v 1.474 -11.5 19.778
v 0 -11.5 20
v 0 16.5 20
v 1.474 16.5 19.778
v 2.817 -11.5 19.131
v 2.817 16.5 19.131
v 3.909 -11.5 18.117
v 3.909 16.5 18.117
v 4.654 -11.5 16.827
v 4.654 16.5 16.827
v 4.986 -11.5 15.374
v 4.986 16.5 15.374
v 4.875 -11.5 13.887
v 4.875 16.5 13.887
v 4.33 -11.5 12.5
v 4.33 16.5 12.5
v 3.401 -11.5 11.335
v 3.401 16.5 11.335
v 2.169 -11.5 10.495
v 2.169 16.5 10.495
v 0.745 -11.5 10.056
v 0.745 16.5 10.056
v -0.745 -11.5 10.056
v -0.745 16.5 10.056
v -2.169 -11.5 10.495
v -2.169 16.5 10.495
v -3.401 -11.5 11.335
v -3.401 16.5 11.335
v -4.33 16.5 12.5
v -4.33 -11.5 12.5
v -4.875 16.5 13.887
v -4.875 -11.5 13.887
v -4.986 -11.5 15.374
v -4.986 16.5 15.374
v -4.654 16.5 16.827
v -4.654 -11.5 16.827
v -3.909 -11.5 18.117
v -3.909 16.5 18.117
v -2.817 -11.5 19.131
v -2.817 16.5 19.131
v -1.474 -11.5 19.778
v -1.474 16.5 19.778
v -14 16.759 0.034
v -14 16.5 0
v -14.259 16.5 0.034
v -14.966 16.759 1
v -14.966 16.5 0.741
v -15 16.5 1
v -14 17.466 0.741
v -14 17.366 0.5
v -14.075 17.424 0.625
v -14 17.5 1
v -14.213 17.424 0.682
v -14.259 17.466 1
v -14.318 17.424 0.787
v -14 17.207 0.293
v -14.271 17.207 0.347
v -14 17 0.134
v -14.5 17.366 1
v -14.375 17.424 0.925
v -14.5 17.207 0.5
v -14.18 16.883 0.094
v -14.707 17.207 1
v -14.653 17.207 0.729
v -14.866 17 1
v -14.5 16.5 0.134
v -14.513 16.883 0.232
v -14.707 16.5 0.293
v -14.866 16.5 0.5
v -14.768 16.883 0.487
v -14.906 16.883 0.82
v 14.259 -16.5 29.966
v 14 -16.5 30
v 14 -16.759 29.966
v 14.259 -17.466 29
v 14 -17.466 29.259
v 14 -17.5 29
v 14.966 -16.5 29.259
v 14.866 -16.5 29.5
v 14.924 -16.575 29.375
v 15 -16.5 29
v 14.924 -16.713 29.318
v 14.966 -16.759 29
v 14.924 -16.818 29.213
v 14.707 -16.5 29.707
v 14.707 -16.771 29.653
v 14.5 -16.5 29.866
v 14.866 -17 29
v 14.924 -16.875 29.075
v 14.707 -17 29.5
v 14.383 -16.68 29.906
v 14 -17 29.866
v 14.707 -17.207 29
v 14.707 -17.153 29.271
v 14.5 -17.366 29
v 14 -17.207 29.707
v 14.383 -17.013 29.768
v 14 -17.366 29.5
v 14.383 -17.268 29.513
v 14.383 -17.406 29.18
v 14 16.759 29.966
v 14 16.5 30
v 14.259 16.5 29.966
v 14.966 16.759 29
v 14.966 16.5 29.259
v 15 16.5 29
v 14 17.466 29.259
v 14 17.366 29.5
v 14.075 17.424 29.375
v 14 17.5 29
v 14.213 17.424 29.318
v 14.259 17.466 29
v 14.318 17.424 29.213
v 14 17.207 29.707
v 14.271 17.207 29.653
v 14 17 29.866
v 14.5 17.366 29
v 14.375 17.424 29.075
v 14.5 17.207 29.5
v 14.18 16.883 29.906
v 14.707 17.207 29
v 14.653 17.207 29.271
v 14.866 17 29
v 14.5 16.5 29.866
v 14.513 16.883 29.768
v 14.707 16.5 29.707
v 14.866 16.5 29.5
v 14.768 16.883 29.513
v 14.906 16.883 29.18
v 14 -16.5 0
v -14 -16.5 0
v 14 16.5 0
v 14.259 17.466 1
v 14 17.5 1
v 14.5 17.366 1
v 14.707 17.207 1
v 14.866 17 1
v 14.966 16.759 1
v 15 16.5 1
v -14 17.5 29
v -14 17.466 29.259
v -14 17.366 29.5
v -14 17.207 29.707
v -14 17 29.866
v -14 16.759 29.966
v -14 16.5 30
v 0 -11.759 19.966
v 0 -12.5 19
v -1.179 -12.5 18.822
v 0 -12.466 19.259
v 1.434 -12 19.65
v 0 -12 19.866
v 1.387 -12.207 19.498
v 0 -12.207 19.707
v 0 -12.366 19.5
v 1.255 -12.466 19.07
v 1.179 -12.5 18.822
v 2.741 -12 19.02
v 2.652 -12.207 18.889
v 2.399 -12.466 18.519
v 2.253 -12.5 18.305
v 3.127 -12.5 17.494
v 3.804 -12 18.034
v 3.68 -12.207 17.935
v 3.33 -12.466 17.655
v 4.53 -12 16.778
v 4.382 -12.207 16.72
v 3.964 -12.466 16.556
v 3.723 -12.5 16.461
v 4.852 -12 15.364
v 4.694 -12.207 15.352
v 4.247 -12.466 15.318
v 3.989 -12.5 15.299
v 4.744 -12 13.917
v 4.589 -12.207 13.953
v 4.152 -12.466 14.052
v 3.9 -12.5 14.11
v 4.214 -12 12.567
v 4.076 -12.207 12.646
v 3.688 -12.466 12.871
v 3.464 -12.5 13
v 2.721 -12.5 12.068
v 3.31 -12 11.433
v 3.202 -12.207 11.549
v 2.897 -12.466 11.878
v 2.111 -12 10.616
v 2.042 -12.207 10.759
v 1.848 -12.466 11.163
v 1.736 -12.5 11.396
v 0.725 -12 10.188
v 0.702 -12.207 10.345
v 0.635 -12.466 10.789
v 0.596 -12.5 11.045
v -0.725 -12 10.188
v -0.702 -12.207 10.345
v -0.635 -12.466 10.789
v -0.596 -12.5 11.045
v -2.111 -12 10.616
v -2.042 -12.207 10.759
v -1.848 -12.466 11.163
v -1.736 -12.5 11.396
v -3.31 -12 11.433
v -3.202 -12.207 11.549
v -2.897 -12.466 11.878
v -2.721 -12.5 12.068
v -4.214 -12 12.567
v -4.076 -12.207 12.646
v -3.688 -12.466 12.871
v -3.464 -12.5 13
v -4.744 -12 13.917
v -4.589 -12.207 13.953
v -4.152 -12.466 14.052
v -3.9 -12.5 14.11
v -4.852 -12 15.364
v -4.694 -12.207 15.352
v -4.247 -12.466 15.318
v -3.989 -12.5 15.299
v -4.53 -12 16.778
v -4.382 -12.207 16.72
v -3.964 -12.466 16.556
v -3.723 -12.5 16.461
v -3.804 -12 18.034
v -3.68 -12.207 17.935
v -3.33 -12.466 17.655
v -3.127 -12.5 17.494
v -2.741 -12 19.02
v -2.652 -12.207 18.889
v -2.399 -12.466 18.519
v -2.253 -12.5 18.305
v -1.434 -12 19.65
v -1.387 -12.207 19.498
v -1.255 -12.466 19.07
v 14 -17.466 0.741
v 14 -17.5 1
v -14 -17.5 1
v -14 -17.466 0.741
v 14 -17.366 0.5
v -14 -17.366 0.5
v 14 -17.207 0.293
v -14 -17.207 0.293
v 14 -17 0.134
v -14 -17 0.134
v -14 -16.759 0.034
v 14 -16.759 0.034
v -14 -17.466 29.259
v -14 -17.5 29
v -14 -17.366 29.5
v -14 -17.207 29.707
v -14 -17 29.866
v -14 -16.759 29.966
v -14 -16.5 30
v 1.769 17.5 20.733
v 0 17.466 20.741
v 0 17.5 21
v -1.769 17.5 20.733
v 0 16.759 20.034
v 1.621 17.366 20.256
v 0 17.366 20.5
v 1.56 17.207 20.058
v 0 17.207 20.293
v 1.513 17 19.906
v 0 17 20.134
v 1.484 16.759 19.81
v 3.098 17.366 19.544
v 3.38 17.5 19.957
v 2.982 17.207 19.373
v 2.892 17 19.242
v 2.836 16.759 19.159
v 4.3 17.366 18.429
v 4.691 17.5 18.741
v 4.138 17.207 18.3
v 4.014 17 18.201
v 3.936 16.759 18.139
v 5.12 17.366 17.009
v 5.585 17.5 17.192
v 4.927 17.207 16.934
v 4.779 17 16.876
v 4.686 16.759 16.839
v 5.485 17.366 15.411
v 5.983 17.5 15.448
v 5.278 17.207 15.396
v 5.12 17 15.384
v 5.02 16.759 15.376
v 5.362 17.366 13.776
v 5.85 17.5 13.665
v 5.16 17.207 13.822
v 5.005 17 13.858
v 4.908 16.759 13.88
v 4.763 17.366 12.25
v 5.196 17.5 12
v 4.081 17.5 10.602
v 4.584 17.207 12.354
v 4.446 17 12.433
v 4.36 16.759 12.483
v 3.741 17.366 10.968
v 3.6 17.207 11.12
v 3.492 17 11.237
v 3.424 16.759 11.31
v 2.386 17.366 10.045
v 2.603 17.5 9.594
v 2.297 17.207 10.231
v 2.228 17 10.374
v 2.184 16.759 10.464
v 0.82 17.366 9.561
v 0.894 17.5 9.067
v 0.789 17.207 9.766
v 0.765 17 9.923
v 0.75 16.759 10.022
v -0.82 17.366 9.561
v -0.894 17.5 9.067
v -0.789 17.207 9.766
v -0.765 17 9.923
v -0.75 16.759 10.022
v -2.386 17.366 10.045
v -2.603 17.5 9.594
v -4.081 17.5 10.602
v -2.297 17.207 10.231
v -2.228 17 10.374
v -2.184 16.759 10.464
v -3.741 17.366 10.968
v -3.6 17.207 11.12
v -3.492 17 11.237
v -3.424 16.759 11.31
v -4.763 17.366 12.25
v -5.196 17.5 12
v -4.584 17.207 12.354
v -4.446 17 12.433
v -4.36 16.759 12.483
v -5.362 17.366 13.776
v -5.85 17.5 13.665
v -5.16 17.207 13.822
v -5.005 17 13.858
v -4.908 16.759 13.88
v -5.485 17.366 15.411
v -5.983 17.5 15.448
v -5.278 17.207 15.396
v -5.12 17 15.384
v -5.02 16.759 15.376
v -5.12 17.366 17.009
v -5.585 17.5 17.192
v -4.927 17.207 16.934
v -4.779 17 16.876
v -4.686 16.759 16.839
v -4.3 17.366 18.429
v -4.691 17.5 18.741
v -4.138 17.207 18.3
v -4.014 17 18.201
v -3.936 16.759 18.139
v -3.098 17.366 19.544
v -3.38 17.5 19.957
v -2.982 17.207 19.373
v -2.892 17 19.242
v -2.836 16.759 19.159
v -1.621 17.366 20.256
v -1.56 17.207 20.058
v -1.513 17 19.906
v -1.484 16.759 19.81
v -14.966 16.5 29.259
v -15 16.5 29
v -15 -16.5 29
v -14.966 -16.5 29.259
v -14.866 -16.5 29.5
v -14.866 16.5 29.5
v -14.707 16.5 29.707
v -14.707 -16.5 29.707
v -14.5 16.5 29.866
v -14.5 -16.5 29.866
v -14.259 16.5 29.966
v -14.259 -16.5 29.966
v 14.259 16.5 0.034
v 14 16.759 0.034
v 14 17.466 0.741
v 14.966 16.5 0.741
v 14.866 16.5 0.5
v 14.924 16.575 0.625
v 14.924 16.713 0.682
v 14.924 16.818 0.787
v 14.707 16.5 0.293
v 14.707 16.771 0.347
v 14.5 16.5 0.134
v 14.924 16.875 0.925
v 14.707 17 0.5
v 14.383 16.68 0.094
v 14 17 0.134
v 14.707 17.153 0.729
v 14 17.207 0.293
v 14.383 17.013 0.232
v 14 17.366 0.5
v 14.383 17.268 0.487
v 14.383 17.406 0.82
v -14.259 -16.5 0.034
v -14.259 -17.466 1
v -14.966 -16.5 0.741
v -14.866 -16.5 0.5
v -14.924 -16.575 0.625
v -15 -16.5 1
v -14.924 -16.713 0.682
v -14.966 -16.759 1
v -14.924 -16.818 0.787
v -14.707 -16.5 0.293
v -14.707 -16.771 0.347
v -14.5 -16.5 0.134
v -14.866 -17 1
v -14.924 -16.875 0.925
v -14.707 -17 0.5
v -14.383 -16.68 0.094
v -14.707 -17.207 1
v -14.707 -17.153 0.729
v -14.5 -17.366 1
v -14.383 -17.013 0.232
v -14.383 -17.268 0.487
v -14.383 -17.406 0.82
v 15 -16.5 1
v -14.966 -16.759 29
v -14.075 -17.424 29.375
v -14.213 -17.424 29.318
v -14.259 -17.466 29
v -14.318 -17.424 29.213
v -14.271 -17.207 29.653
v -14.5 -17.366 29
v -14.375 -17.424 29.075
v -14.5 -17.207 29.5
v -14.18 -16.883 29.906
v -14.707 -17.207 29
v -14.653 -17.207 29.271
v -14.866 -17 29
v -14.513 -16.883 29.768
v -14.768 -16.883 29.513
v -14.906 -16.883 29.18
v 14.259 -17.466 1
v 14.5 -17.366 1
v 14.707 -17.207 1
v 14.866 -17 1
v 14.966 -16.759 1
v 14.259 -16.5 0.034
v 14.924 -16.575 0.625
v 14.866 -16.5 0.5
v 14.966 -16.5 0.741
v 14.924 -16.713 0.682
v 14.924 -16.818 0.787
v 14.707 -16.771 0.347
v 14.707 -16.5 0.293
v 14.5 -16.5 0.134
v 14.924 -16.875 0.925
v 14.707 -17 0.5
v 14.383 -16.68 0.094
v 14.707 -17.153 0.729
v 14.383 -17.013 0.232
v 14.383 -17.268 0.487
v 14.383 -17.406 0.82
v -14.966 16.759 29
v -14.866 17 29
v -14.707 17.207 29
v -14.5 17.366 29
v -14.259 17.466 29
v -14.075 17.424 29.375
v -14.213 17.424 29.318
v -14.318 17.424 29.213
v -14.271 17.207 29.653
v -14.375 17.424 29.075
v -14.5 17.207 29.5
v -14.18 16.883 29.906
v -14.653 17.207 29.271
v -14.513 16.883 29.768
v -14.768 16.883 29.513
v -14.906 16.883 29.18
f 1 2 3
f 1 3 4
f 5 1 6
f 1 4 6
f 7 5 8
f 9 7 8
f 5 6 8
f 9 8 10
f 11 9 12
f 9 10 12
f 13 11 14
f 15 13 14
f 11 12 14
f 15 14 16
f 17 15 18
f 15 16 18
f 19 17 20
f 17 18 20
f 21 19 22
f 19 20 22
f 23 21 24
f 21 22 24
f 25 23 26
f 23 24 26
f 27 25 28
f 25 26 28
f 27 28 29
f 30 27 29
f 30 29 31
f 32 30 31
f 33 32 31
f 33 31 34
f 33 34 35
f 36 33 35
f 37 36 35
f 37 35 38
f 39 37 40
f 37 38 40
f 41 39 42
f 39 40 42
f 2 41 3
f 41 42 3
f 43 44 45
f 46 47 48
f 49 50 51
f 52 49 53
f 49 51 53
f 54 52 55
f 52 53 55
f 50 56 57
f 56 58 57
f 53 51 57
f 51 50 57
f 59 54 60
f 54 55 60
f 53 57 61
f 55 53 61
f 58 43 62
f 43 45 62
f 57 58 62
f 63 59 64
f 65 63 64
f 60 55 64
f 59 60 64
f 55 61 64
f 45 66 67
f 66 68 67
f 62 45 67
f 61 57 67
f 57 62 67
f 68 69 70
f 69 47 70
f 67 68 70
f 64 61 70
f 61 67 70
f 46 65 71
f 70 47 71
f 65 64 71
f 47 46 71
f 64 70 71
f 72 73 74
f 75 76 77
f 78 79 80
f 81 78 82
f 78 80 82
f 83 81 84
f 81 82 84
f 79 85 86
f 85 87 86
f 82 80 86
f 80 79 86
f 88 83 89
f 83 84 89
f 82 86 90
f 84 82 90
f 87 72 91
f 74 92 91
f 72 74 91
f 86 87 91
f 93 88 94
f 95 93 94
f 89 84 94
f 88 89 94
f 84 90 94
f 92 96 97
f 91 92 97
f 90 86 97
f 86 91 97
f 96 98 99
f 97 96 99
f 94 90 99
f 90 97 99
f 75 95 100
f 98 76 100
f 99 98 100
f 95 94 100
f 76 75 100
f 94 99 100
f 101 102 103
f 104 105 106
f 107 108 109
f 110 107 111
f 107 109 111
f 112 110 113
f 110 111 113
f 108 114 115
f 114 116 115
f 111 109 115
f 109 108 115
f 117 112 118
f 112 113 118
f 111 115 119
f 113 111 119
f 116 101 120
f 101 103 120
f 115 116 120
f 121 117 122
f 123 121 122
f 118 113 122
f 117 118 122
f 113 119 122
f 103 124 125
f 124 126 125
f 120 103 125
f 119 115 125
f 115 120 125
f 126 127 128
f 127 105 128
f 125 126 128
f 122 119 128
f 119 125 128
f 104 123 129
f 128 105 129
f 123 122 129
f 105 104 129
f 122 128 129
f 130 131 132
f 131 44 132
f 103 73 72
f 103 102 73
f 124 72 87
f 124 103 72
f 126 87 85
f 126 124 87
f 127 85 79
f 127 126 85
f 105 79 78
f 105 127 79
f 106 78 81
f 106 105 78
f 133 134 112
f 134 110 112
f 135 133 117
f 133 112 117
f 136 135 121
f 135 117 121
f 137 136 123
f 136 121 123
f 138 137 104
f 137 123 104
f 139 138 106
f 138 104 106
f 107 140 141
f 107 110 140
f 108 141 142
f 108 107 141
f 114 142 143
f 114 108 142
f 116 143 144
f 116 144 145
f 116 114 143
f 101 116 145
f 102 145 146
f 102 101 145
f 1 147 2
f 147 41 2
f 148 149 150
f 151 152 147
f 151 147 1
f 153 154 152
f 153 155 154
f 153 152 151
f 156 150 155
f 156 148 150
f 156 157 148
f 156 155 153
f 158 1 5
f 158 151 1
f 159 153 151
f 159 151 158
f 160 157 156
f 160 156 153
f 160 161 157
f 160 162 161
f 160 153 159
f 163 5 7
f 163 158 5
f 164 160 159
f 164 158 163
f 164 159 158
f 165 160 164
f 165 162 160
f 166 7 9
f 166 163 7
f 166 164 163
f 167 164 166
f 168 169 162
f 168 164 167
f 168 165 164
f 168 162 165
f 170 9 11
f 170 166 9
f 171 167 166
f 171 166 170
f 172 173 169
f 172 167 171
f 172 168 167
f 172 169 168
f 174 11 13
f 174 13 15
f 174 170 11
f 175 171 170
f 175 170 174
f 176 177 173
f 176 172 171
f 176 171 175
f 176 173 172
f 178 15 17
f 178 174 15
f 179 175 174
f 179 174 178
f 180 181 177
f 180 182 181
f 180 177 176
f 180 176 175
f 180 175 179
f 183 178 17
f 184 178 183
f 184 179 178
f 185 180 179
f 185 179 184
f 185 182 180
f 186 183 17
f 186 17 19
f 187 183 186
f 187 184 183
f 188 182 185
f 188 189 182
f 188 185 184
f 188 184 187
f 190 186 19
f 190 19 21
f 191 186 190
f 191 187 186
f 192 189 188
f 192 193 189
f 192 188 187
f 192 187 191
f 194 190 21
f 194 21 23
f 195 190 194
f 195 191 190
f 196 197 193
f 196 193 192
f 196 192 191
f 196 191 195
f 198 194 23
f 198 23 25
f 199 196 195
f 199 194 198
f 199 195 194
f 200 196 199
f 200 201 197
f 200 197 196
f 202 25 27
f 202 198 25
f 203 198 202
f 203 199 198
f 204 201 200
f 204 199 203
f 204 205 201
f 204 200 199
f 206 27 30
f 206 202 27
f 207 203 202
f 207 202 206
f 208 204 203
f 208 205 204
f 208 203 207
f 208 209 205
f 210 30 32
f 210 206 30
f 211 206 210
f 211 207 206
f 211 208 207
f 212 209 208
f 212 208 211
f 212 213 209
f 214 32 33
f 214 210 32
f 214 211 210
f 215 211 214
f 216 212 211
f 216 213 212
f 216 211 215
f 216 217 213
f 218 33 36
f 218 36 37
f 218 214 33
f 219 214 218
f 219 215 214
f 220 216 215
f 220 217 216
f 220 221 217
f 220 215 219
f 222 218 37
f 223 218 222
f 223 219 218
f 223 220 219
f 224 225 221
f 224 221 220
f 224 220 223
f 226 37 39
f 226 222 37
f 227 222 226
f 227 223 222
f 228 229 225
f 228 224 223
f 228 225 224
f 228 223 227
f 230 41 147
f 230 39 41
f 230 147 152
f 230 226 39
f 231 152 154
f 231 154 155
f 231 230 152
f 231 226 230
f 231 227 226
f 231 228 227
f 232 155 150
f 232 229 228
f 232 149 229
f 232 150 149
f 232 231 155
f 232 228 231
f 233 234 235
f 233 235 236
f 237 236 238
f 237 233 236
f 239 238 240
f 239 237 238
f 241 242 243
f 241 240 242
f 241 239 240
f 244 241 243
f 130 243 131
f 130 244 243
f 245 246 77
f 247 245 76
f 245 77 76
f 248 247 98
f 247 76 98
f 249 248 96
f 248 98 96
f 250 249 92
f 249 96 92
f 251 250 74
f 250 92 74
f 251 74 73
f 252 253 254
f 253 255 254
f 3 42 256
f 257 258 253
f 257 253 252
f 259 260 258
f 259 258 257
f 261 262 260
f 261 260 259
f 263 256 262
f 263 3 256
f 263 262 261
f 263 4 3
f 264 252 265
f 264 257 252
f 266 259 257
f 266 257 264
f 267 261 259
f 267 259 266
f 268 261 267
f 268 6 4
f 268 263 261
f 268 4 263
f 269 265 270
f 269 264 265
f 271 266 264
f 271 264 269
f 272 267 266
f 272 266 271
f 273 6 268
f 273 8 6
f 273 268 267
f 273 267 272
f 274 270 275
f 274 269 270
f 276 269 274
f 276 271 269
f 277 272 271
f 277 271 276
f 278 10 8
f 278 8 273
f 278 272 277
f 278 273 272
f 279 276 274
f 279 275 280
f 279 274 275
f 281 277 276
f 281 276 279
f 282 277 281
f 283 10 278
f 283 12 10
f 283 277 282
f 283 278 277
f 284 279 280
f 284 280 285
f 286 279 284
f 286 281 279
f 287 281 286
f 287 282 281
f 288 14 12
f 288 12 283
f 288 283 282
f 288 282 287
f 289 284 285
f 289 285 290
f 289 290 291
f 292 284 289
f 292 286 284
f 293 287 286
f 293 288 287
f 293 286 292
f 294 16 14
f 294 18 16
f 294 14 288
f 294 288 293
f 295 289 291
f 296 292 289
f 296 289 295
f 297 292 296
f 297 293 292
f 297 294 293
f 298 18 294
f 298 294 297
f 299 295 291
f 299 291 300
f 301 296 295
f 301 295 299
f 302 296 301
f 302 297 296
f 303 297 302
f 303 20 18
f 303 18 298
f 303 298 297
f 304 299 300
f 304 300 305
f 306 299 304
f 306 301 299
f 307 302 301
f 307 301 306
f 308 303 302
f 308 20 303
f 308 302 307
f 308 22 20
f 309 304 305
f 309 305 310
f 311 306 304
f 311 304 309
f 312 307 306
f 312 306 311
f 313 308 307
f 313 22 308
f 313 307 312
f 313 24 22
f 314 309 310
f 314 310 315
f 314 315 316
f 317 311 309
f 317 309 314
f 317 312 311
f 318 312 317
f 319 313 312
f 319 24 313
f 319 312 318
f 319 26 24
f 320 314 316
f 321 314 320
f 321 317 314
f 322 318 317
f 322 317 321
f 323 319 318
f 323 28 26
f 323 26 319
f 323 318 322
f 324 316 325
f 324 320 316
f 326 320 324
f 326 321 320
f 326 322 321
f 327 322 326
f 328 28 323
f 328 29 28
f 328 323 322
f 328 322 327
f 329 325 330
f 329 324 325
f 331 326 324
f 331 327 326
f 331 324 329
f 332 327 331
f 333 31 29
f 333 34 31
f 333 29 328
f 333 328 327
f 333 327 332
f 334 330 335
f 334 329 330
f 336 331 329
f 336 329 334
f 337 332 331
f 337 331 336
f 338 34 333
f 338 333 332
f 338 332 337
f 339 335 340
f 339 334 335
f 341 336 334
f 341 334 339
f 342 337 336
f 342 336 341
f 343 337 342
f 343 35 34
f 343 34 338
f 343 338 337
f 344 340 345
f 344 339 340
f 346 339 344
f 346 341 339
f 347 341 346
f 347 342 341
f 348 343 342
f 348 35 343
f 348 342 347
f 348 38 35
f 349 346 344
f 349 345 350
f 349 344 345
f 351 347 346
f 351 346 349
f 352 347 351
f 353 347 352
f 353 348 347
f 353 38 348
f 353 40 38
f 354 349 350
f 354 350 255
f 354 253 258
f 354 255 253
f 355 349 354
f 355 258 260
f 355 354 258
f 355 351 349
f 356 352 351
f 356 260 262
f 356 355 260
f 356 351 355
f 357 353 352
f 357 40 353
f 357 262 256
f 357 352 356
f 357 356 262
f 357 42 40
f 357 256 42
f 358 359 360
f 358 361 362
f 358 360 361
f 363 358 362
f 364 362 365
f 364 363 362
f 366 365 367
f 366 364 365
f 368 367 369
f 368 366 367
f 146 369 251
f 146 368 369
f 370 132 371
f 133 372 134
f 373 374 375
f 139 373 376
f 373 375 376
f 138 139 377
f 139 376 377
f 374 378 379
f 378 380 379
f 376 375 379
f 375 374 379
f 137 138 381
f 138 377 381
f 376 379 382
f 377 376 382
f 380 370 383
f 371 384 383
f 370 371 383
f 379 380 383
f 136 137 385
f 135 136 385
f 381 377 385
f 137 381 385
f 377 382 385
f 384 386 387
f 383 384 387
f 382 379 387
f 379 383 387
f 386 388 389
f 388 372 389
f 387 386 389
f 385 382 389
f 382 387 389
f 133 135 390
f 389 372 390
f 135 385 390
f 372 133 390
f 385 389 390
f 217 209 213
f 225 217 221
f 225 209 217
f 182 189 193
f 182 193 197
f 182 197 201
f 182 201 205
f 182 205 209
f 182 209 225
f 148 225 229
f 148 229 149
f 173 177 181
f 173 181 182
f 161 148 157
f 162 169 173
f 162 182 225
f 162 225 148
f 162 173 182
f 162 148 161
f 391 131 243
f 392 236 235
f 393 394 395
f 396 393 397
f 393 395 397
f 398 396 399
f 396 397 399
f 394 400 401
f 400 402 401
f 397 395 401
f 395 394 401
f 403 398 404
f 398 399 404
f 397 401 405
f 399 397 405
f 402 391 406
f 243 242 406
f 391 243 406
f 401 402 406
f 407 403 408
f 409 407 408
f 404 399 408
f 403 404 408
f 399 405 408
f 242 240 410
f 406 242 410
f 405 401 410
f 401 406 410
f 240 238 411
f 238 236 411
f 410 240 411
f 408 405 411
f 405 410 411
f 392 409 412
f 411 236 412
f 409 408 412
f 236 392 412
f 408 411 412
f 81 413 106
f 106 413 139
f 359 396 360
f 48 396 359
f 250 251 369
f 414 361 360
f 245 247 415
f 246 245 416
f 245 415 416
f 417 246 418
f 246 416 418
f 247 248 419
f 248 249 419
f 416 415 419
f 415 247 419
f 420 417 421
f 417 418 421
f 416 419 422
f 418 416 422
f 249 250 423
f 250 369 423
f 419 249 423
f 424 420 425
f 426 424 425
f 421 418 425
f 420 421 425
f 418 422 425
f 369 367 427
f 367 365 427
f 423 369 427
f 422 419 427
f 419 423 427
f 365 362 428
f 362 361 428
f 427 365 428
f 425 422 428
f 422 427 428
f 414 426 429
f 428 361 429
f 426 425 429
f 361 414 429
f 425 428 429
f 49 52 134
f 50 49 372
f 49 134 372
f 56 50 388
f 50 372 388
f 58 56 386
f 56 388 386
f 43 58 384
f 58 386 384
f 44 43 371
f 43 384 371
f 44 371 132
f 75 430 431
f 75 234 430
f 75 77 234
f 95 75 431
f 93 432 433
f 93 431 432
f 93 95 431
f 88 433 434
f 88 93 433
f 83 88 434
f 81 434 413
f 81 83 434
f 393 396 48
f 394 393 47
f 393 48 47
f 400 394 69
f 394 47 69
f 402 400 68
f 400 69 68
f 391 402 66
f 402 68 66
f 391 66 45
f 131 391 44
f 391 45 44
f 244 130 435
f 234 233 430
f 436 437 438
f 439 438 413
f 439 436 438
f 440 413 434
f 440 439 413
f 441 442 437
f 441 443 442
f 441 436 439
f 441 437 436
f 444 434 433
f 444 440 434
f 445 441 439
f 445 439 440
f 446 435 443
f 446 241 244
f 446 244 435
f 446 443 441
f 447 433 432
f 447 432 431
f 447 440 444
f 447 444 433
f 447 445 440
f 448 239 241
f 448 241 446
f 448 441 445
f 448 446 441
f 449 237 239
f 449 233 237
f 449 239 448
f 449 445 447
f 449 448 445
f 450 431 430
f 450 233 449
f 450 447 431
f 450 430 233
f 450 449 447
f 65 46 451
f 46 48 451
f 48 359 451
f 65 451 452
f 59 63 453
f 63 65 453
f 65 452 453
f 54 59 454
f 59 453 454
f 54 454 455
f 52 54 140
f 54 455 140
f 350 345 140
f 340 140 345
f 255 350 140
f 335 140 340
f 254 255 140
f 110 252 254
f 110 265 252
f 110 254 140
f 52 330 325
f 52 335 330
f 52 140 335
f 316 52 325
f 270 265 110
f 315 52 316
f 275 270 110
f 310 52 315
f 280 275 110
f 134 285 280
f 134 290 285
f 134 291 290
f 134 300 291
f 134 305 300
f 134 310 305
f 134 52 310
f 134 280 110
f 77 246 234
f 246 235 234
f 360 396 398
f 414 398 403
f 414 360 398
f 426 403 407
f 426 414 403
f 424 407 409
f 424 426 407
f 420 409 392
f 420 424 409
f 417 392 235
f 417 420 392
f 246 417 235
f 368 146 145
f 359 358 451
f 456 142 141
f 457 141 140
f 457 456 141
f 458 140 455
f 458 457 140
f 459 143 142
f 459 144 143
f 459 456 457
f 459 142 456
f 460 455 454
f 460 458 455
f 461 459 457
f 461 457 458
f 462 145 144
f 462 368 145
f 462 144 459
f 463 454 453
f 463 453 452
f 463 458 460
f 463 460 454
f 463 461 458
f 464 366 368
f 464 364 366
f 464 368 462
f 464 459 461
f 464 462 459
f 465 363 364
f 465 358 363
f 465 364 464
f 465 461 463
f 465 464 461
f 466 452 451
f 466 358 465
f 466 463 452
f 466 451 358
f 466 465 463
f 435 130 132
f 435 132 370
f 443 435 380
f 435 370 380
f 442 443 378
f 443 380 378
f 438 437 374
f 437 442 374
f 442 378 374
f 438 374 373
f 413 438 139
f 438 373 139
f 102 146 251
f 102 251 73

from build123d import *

# Parameters (mm, degrees)
SKETCH1_W           = 30
SKETCH1_H           = 35
BOSS_EXTRUDE1_DEPTH = 30
SKETCH2_R           = 5
CUT_EXTRUDE1_DEPTH  = 30
FILLET2_R           = 1


with BuildPart() as part:
    # Sketch1 → Boss-Extrude1 (new body)
    with BuildSketch(Plane.XY):
        Rectangle(SKETCH1_W, SKETCH1_H)
    extrude(amount=BOSS_EXTRUDE1_DEPTH)

    # Sketch2 → Cut-Extrude1 (cut)
    with BuildSketch(Plane(origin=(0, 17.5, 0), x_dir=(1, 0, 0), z_dir=(0, 1, 0))):
        with Locations(Location((0, -15, 0), (0, 0, 270))):
            Circle(SKETCH2_R)
    extrude(amount=-CUT_EXTRUDE1_DEPTH, mode=Mode.SUBTRACT)

    # Fillet2
    fillet2_edges = [part.edges().sort_by_distance(p)[0] for p in [
        (-15, 0, 30),
        (0, -17.5, 30),
        (0, -12.5, 10),
        (0, 17.5, 10),
        (15, 0, 30),
        (0, -17.5, 0),
        (-15, 0, 0),
        (0, 17.5, 0),
        (15, 0, 0),
        (0, 17.5, 30),
        (15, -17.5, 15),
        (-15, -17.5, 15),
        (-15, 17.5, 15),
        (15, 17.5, 15),
    ]]
    fillet(fillet2_edges, radius=FILLET2_R)


solid = part.part
